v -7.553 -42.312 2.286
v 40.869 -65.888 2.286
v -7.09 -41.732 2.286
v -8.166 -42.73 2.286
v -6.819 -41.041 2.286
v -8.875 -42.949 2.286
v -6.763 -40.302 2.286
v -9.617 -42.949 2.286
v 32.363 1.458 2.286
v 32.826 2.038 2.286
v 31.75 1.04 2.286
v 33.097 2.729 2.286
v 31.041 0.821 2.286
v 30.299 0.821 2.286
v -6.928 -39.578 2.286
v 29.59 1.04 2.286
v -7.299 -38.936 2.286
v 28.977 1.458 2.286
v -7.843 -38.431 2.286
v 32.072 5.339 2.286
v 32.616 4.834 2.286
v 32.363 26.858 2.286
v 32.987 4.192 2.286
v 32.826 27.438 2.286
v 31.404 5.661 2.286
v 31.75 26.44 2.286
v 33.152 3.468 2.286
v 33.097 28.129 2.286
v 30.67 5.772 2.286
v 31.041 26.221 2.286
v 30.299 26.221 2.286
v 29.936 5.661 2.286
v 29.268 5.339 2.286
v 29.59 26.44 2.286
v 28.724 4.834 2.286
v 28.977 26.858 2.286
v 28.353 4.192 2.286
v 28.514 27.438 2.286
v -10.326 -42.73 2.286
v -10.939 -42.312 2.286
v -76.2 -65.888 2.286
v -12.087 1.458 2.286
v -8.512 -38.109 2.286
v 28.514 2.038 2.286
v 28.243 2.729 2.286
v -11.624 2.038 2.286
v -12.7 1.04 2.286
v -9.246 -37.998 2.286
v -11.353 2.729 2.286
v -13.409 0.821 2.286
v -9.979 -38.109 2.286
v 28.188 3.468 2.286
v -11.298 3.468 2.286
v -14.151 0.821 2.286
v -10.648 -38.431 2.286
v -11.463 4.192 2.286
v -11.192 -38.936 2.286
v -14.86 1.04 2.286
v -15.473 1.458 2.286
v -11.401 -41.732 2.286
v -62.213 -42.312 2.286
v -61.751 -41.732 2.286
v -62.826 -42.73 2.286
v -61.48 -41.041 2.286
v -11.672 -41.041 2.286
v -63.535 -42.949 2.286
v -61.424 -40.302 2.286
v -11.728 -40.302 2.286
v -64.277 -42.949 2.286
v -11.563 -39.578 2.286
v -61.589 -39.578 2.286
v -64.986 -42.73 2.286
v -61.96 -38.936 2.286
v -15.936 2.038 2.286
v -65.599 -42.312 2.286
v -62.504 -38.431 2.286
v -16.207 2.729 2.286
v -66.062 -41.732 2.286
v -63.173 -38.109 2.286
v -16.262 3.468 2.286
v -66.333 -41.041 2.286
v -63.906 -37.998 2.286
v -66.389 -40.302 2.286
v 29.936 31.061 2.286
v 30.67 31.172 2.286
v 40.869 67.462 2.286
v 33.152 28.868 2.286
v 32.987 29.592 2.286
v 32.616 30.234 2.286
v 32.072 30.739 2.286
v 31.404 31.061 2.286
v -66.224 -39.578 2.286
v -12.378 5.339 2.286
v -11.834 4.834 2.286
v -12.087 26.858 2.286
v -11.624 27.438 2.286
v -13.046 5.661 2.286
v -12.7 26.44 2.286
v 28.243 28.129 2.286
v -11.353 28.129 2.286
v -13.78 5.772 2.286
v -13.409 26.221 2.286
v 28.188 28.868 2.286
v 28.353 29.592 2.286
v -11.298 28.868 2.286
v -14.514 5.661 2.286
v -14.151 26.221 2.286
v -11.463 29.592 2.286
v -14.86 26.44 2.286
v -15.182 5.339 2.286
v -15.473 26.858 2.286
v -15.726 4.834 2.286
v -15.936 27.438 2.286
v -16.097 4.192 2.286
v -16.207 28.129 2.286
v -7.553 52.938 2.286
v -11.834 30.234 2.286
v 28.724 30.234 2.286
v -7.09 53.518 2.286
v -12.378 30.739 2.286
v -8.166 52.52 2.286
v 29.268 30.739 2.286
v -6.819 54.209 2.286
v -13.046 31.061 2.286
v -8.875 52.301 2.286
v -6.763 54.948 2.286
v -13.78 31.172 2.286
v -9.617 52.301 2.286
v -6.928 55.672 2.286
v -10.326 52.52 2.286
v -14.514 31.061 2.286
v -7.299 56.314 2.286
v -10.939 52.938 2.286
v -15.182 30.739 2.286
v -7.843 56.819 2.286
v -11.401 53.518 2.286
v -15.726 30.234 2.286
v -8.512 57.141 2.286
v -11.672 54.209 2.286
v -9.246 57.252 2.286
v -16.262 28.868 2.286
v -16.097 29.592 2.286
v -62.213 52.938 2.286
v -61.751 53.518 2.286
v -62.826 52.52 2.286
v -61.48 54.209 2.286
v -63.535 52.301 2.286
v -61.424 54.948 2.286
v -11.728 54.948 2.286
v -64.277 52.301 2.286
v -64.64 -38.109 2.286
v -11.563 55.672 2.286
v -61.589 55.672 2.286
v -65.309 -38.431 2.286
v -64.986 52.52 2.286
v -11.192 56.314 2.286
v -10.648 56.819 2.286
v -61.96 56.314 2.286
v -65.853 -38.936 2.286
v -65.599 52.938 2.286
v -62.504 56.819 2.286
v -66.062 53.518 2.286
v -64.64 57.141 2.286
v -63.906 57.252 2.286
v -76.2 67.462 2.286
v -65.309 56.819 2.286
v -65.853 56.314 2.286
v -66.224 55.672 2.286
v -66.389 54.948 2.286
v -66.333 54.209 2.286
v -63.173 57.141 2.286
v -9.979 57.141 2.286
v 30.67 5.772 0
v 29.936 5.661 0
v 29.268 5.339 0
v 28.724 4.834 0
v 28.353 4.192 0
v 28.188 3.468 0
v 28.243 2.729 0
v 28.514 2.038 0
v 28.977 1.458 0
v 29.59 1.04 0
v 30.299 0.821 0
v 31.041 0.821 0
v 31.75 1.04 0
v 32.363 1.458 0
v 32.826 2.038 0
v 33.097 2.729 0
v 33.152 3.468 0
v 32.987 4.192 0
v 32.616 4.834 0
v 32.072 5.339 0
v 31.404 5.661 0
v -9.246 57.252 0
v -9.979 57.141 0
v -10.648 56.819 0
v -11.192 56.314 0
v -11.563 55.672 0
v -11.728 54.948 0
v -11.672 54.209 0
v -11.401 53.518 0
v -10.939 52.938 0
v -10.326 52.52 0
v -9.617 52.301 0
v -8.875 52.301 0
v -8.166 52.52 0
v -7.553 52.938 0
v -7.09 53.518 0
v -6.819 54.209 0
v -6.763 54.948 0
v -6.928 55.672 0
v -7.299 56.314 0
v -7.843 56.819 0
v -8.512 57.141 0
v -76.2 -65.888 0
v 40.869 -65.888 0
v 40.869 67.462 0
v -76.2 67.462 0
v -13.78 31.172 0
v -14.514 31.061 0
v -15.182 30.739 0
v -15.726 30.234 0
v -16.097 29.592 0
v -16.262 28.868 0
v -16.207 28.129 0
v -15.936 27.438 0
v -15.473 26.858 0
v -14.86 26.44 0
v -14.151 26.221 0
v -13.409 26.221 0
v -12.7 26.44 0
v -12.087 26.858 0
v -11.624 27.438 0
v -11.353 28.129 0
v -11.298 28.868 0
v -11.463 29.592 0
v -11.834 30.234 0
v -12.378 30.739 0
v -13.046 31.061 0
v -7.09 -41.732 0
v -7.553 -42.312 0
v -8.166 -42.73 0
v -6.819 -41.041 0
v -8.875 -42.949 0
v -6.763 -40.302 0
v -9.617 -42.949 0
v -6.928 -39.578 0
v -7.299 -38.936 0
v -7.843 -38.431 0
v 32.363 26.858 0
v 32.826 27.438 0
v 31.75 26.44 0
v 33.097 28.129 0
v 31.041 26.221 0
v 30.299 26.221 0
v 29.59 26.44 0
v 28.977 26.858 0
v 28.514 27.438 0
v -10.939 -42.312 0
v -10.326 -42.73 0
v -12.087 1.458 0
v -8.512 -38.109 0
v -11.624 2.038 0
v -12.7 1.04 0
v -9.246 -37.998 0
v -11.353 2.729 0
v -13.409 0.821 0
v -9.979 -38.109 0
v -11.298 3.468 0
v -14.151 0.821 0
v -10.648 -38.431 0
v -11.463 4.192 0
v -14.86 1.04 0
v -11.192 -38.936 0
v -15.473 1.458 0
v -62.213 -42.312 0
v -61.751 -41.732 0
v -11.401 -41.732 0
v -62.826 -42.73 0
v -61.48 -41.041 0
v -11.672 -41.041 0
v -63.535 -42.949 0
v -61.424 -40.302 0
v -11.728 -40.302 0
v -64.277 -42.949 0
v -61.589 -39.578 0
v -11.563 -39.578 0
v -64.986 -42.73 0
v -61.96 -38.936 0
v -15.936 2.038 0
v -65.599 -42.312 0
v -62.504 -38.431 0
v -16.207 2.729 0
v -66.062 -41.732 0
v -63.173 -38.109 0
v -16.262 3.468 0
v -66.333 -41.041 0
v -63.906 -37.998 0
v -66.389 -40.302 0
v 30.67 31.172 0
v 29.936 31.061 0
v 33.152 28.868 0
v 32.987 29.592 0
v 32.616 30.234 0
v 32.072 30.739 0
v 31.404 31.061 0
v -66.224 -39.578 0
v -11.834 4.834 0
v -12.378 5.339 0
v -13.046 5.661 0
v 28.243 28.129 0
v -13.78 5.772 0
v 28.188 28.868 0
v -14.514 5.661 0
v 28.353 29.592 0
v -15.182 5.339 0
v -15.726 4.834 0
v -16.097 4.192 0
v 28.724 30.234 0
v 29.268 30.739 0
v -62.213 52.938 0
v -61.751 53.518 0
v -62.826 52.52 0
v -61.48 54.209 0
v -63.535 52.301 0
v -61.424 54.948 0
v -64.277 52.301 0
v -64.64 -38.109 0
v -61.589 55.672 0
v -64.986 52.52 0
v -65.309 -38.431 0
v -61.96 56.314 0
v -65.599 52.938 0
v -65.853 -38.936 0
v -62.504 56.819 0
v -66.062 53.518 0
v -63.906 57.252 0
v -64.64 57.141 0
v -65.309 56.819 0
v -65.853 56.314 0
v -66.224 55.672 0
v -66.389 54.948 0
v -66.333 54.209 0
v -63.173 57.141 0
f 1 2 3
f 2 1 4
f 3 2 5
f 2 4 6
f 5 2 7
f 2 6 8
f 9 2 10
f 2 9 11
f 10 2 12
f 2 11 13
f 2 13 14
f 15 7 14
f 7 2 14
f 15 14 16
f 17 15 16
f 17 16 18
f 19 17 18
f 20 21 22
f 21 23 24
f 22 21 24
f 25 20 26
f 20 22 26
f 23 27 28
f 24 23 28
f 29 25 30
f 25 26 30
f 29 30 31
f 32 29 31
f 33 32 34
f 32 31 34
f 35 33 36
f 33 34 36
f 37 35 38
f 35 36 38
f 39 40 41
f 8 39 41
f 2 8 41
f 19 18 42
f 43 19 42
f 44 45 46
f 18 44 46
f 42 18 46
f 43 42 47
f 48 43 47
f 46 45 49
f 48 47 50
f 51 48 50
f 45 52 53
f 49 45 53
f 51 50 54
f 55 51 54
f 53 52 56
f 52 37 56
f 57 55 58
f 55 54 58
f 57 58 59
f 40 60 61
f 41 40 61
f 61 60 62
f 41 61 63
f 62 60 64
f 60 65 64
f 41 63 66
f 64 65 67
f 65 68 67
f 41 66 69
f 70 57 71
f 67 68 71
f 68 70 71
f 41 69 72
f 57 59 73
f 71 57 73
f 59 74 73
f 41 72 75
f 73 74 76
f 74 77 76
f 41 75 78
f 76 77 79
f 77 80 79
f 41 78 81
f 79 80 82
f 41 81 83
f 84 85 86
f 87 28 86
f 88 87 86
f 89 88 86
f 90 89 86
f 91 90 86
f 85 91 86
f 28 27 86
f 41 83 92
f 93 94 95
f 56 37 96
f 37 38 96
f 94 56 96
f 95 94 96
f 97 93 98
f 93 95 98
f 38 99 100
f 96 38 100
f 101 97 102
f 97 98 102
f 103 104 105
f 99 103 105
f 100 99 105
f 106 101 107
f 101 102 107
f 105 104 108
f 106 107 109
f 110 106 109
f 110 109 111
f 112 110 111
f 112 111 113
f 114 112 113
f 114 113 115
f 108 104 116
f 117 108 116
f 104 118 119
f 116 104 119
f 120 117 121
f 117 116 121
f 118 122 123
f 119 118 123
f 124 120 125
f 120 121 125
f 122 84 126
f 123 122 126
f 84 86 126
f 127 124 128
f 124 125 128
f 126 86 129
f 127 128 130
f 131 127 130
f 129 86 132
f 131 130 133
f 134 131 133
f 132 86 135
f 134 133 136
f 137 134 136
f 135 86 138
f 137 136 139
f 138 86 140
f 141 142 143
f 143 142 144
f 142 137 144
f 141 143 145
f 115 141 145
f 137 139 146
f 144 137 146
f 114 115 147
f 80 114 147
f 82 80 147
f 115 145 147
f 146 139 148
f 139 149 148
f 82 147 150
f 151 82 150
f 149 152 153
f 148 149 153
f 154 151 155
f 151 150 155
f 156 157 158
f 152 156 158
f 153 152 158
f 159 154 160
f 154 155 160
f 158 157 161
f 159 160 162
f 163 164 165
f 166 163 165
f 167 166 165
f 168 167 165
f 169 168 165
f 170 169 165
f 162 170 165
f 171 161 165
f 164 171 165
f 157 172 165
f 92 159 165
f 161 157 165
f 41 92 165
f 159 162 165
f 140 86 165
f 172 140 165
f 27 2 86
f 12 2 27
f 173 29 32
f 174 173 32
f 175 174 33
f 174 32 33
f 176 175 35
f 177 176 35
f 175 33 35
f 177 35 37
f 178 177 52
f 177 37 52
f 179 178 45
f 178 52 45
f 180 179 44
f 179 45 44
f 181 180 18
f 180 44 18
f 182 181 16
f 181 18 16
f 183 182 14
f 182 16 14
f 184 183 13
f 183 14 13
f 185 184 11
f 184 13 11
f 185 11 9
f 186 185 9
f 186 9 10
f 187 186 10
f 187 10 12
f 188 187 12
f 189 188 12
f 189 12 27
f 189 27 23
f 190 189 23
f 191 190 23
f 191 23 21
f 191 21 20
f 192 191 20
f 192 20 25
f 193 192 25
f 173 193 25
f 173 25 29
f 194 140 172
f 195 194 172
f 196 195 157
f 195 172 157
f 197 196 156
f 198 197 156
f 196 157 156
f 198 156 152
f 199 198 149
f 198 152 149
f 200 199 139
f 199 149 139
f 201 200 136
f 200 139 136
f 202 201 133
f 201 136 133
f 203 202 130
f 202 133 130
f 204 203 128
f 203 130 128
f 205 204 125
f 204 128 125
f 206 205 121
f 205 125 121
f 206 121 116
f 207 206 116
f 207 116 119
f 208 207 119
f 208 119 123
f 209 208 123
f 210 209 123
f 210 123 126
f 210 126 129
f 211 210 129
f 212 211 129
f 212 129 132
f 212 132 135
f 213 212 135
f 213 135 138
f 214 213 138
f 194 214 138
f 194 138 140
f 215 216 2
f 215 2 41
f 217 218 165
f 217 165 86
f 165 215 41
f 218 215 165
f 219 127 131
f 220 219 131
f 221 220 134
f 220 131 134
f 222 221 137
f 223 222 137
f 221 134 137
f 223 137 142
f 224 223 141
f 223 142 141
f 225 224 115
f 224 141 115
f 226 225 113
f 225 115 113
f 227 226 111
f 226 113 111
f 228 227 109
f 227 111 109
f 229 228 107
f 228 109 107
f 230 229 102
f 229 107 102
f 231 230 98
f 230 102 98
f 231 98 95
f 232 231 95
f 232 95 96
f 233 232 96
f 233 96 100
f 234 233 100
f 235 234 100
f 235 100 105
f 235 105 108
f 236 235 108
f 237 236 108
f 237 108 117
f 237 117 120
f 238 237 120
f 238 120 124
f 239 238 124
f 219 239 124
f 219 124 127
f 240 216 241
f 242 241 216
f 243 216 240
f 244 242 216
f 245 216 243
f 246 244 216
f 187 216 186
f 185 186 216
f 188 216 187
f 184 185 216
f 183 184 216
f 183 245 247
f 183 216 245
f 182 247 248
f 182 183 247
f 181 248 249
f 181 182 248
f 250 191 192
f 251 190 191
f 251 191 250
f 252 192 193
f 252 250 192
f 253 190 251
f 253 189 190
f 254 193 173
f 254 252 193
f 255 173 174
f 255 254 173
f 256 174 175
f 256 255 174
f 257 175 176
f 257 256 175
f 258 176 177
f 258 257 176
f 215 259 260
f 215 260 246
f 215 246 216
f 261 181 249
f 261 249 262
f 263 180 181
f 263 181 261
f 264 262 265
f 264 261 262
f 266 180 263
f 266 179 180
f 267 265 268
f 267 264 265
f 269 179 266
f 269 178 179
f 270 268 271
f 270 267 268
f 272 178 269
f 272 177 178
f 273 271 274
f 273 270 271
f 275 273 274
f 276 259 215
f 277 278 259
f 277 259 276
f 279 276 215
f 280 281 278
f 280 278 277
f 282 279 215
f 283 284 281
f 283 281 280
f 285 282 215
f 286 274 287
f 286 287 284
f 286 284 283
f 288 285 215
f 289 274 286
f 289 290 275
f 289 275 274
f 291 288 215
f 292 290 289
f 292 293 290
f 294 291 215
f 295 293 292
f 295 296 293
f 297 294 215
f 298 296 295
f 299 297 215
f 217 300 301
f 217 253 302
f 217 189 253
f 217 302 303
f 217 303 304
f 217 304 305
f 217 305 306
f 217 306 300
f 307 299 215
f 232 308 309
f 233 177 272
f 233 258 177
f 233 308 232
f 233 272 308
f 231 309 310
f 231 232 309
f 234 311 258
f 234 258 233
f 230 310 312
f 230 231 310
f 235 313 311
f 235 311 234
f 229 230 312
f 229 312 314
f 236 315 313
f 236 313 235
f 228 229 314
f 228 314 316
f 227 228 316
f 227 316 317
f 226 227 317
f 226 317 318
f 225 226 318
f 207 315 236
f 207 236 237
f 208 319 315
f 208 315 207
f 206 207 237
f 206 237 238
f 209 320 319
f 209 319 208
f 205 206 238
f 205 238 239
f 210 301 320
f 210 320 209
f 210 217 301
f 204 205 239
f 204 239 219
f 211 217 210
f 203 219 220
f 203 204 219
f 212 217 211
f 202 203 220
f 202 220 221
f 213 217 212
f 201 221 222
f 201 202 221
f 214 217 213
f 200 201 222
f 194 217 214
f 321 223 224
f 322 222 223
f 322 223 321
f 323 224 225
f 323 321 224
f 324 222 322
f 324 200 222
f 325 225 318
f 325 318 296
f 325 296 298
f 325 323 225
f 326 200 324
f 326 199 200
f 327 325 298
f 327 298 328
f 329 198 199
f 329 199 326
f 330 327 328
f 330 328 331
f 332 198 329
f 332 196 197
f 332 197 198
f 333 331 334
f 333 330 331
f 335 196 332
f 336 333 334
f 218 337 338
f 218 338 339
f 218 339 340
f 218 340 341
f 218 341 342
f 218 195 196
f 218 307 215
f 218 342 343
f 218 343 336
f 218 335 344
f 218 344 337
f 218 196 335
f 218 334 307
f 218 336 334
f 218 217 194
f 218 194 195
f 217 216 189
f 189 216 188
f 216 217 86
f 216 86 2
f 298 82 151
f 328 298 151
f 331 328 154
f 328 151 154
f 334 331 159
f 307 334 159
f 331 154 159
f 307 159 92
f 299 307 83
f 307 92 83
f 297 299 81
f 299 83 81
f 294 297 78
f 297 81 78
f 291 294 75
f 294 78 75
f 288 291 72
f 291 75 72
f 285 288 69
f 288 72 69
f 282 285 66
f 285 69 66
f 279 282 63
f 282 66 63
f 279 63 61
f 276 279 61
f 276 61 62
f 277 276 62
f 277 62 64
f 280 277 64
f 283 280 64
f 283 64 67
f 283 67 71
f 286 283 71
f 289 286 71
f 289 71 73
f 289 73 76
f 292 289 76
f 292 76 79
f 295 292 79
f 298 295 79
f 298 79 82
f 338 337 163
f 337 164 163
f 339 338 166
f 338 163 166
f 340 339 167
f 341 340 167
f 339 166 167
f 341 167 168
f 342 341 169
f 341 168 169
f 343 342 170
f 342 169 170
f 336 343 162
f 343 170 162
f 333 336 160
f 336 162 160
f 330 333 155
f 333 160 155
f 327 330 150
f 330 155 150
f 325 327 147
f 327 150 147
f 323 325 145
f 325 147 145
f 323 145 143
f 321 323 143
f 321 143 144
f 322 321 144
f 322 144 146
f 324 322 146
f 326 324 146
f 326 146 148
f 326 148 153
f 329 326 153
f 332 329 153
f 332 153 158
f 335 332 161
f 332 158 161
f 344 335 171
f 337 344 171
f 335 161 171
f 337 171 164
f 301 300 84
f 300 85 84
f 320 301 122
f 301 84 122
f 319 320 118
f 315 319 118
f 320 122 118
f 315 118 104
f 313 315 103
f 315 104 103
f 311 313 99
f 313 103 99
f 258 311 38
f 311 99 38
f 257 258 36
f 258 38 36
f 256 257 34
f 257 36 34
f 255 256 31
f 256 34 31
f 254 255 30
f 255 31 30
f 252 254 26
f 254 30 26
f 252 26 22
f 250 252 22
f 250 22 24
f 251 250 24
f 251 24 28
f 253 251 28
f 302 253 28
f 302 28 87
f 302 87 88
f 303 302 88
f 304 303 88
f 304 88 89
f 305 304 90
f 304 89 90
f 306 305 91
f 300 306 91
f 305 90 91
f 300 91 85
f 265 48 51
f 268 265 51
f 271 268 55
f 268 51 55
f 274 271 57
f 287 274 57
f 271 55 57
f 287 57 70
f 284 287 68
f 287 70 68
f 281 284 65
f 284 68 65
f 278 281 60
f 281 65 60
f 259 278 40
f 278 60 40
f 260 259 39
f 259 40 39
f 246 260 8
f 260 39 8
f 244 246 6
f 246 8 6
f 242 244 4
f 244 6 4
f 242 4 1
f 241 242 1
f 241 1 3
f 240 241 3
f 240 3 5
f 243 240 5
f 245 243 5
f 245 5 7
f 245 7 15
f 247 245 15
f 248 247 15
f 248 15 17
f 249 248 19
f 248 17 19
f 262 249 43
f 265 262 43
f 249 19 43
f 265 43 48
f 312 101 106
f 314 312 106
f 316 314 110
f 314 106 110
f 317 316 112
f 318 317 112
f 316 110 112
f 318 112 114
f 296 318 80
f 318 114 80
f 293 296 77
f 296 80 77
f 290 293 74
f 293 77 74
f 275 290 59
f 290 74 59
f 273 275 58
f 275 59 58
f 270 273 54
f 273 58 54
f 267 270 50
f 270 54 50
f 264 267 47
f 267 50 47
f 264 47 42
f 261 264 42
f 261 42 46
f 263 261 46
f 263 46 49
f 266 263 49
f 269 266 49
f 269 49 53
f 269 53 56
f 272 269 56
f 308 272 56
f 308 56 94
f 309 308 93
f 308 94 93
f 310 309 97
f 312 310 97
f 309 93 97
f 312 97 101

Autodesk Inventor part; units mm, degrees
ref_plane "YZ Plane" through (0, 0, 0) normal (1, 0, 0) x (0, 1, 0)
ref_plane "XZ Plane" through (0, 0, 0) normal (0, 1, 0) x (-1, 0, 0)
ref_plane "XY Plane" through (0, 0, 0) normal (0, 0, 1) x (1, 0, 0)
sketch "Sketch1" plane through (0, 0, 0) normal (0, 0, 1) x (1, 0, 0)
  line L0 (76.2, -65.8876) -> (-76.2, -65.8876)
  line L1 (-76.2, -65.8876) -> (-76.2, 65.8876)
  line L2 (-76.2, 65.8876) -> (40.8686, 65.8876)
  line L3 (76.2, 65.8876) -> (76.2, -65.8876)
  line L4 (76.2, -65.8876) -> (-76.2, 65.8876) construction
  line L5 (-76.2, -65.8876) -> (76.2, 65.8876) construction
  line L6 (-76.2, -65.8876) -> (-57.6516, -65.8876)
  line L7 (76.2, -65.8876) -> (57.6517, -65.8876)
  line L8 (40.8686, 65.8876) -> (40.8686, -65.8876)
  point P0 (0, 0)
  dimension "d10" = 131.7752
  dimension "d11" = 152.4
  dimension "d12" = 35.3314
extrude "Extrusion2" add sketch "Sketch1" along normal blind 2.286
sketch "Sketch2" plane through (0, 0, 0) normal (0, 0, -1) x (-1, 0, 0)
  circle A0 centre (13.7802, 28.6824) radius 2.0193 projected
  circle A1 centre (-30.6698, 28.6824) radius 2.0193 projected
  circle A2 centre (-30.6698, 3.2824) radius 2.0193 projected
  circle A3 centre (13.7802, 3.2824) radius 2.0193 projected
  point P0 (0, 0)
hole "Hole1" at (-13.7802, 3.2824, 0) at (30.6698, 3.2824, 0) at (30.6698, 28.6824, 0) at (-13.7802, 28.6824, 0) direction (0, 0, 1) diameter 4.9784 end through all clearance for "Flat Head Machine Screw (82)" size "#10" standard "Ansi Unified Screw Threads"
sketch "Sketch3" plane through (0, 0, 0) normal (0, 0, -1) x (-1, 0, 0)
  line L0 (-126.5936, 67.4624) -> (-126.5936, 42.0624) projected
  line L1 (-126.5936, 67.4624) -> (610.0064, 67.4624) projected
  line L2 (-126.5936, 42.0624) -> (610.0064, 42.0624) projected
  line L3 (-66.2686, -65.8876) -> (549.6814, -65.8876) projected
  line L4 (549.6814, -15.0876) -> (-66.2686, -15.0876) projected
  point P0 (0, 0)
  point P1 (63.9064, -40.4876)
  point P2 (9.2456, -40.4876)
  point P3 (63.9064, 54.7624)
  point P4 (9.2456, 54.7624)
  dimension "d21" = 190.5
  dimension "d22" = 0
  dimension "d23" = 25.4
  dimension "d24" = 12.7
  dimension "d25" = 25.4
  dimension "d26" = 12.7
  dimension "d27" = 135.8392
  dimension "d28" = 135.8392
hole "Hole2" at (-63.9064, -40.4876, 0) at (-9.2456, -40.4876, 0) at (-63.9064, 54.7624, 0) at (-9.2456, 54.7624, 0) direction (0, 0, 1) diameter 4.9784 end through all clearance for "Flat Head Machine Screw (82)" size "#10" standard "Ansi Unified Screw Threads"
sketch "Sketch4" plane through (0, 0, 0) normal (0, 0, -1) x (-1, 0, 0)
  line L0 (-40.8686, 65.8876) -> (76.2, 65.8876) projected
  line L1 (-40.8686, 65.8876) -> (76.2, 65.8876)
  line L2 (76.2, 65.8876) -> (76.2, 67.4624)
  line L3 (76.2, 67.4624) -> (-40.8686, 67.4624)
  line L4 (-40.8686, 67.4624) -> (-40.8686, 65.8876)
  line L5 (76.2, -65.8876) -> (76.2, 65.8876) projected
  point P0 (0, 0)
  dimension "d36" = 1.5748
extrude "Extrusion3" add sketch "Sketch4" against normal up to surface (2.286 mm away)
equation "\"d28\" = d27"
